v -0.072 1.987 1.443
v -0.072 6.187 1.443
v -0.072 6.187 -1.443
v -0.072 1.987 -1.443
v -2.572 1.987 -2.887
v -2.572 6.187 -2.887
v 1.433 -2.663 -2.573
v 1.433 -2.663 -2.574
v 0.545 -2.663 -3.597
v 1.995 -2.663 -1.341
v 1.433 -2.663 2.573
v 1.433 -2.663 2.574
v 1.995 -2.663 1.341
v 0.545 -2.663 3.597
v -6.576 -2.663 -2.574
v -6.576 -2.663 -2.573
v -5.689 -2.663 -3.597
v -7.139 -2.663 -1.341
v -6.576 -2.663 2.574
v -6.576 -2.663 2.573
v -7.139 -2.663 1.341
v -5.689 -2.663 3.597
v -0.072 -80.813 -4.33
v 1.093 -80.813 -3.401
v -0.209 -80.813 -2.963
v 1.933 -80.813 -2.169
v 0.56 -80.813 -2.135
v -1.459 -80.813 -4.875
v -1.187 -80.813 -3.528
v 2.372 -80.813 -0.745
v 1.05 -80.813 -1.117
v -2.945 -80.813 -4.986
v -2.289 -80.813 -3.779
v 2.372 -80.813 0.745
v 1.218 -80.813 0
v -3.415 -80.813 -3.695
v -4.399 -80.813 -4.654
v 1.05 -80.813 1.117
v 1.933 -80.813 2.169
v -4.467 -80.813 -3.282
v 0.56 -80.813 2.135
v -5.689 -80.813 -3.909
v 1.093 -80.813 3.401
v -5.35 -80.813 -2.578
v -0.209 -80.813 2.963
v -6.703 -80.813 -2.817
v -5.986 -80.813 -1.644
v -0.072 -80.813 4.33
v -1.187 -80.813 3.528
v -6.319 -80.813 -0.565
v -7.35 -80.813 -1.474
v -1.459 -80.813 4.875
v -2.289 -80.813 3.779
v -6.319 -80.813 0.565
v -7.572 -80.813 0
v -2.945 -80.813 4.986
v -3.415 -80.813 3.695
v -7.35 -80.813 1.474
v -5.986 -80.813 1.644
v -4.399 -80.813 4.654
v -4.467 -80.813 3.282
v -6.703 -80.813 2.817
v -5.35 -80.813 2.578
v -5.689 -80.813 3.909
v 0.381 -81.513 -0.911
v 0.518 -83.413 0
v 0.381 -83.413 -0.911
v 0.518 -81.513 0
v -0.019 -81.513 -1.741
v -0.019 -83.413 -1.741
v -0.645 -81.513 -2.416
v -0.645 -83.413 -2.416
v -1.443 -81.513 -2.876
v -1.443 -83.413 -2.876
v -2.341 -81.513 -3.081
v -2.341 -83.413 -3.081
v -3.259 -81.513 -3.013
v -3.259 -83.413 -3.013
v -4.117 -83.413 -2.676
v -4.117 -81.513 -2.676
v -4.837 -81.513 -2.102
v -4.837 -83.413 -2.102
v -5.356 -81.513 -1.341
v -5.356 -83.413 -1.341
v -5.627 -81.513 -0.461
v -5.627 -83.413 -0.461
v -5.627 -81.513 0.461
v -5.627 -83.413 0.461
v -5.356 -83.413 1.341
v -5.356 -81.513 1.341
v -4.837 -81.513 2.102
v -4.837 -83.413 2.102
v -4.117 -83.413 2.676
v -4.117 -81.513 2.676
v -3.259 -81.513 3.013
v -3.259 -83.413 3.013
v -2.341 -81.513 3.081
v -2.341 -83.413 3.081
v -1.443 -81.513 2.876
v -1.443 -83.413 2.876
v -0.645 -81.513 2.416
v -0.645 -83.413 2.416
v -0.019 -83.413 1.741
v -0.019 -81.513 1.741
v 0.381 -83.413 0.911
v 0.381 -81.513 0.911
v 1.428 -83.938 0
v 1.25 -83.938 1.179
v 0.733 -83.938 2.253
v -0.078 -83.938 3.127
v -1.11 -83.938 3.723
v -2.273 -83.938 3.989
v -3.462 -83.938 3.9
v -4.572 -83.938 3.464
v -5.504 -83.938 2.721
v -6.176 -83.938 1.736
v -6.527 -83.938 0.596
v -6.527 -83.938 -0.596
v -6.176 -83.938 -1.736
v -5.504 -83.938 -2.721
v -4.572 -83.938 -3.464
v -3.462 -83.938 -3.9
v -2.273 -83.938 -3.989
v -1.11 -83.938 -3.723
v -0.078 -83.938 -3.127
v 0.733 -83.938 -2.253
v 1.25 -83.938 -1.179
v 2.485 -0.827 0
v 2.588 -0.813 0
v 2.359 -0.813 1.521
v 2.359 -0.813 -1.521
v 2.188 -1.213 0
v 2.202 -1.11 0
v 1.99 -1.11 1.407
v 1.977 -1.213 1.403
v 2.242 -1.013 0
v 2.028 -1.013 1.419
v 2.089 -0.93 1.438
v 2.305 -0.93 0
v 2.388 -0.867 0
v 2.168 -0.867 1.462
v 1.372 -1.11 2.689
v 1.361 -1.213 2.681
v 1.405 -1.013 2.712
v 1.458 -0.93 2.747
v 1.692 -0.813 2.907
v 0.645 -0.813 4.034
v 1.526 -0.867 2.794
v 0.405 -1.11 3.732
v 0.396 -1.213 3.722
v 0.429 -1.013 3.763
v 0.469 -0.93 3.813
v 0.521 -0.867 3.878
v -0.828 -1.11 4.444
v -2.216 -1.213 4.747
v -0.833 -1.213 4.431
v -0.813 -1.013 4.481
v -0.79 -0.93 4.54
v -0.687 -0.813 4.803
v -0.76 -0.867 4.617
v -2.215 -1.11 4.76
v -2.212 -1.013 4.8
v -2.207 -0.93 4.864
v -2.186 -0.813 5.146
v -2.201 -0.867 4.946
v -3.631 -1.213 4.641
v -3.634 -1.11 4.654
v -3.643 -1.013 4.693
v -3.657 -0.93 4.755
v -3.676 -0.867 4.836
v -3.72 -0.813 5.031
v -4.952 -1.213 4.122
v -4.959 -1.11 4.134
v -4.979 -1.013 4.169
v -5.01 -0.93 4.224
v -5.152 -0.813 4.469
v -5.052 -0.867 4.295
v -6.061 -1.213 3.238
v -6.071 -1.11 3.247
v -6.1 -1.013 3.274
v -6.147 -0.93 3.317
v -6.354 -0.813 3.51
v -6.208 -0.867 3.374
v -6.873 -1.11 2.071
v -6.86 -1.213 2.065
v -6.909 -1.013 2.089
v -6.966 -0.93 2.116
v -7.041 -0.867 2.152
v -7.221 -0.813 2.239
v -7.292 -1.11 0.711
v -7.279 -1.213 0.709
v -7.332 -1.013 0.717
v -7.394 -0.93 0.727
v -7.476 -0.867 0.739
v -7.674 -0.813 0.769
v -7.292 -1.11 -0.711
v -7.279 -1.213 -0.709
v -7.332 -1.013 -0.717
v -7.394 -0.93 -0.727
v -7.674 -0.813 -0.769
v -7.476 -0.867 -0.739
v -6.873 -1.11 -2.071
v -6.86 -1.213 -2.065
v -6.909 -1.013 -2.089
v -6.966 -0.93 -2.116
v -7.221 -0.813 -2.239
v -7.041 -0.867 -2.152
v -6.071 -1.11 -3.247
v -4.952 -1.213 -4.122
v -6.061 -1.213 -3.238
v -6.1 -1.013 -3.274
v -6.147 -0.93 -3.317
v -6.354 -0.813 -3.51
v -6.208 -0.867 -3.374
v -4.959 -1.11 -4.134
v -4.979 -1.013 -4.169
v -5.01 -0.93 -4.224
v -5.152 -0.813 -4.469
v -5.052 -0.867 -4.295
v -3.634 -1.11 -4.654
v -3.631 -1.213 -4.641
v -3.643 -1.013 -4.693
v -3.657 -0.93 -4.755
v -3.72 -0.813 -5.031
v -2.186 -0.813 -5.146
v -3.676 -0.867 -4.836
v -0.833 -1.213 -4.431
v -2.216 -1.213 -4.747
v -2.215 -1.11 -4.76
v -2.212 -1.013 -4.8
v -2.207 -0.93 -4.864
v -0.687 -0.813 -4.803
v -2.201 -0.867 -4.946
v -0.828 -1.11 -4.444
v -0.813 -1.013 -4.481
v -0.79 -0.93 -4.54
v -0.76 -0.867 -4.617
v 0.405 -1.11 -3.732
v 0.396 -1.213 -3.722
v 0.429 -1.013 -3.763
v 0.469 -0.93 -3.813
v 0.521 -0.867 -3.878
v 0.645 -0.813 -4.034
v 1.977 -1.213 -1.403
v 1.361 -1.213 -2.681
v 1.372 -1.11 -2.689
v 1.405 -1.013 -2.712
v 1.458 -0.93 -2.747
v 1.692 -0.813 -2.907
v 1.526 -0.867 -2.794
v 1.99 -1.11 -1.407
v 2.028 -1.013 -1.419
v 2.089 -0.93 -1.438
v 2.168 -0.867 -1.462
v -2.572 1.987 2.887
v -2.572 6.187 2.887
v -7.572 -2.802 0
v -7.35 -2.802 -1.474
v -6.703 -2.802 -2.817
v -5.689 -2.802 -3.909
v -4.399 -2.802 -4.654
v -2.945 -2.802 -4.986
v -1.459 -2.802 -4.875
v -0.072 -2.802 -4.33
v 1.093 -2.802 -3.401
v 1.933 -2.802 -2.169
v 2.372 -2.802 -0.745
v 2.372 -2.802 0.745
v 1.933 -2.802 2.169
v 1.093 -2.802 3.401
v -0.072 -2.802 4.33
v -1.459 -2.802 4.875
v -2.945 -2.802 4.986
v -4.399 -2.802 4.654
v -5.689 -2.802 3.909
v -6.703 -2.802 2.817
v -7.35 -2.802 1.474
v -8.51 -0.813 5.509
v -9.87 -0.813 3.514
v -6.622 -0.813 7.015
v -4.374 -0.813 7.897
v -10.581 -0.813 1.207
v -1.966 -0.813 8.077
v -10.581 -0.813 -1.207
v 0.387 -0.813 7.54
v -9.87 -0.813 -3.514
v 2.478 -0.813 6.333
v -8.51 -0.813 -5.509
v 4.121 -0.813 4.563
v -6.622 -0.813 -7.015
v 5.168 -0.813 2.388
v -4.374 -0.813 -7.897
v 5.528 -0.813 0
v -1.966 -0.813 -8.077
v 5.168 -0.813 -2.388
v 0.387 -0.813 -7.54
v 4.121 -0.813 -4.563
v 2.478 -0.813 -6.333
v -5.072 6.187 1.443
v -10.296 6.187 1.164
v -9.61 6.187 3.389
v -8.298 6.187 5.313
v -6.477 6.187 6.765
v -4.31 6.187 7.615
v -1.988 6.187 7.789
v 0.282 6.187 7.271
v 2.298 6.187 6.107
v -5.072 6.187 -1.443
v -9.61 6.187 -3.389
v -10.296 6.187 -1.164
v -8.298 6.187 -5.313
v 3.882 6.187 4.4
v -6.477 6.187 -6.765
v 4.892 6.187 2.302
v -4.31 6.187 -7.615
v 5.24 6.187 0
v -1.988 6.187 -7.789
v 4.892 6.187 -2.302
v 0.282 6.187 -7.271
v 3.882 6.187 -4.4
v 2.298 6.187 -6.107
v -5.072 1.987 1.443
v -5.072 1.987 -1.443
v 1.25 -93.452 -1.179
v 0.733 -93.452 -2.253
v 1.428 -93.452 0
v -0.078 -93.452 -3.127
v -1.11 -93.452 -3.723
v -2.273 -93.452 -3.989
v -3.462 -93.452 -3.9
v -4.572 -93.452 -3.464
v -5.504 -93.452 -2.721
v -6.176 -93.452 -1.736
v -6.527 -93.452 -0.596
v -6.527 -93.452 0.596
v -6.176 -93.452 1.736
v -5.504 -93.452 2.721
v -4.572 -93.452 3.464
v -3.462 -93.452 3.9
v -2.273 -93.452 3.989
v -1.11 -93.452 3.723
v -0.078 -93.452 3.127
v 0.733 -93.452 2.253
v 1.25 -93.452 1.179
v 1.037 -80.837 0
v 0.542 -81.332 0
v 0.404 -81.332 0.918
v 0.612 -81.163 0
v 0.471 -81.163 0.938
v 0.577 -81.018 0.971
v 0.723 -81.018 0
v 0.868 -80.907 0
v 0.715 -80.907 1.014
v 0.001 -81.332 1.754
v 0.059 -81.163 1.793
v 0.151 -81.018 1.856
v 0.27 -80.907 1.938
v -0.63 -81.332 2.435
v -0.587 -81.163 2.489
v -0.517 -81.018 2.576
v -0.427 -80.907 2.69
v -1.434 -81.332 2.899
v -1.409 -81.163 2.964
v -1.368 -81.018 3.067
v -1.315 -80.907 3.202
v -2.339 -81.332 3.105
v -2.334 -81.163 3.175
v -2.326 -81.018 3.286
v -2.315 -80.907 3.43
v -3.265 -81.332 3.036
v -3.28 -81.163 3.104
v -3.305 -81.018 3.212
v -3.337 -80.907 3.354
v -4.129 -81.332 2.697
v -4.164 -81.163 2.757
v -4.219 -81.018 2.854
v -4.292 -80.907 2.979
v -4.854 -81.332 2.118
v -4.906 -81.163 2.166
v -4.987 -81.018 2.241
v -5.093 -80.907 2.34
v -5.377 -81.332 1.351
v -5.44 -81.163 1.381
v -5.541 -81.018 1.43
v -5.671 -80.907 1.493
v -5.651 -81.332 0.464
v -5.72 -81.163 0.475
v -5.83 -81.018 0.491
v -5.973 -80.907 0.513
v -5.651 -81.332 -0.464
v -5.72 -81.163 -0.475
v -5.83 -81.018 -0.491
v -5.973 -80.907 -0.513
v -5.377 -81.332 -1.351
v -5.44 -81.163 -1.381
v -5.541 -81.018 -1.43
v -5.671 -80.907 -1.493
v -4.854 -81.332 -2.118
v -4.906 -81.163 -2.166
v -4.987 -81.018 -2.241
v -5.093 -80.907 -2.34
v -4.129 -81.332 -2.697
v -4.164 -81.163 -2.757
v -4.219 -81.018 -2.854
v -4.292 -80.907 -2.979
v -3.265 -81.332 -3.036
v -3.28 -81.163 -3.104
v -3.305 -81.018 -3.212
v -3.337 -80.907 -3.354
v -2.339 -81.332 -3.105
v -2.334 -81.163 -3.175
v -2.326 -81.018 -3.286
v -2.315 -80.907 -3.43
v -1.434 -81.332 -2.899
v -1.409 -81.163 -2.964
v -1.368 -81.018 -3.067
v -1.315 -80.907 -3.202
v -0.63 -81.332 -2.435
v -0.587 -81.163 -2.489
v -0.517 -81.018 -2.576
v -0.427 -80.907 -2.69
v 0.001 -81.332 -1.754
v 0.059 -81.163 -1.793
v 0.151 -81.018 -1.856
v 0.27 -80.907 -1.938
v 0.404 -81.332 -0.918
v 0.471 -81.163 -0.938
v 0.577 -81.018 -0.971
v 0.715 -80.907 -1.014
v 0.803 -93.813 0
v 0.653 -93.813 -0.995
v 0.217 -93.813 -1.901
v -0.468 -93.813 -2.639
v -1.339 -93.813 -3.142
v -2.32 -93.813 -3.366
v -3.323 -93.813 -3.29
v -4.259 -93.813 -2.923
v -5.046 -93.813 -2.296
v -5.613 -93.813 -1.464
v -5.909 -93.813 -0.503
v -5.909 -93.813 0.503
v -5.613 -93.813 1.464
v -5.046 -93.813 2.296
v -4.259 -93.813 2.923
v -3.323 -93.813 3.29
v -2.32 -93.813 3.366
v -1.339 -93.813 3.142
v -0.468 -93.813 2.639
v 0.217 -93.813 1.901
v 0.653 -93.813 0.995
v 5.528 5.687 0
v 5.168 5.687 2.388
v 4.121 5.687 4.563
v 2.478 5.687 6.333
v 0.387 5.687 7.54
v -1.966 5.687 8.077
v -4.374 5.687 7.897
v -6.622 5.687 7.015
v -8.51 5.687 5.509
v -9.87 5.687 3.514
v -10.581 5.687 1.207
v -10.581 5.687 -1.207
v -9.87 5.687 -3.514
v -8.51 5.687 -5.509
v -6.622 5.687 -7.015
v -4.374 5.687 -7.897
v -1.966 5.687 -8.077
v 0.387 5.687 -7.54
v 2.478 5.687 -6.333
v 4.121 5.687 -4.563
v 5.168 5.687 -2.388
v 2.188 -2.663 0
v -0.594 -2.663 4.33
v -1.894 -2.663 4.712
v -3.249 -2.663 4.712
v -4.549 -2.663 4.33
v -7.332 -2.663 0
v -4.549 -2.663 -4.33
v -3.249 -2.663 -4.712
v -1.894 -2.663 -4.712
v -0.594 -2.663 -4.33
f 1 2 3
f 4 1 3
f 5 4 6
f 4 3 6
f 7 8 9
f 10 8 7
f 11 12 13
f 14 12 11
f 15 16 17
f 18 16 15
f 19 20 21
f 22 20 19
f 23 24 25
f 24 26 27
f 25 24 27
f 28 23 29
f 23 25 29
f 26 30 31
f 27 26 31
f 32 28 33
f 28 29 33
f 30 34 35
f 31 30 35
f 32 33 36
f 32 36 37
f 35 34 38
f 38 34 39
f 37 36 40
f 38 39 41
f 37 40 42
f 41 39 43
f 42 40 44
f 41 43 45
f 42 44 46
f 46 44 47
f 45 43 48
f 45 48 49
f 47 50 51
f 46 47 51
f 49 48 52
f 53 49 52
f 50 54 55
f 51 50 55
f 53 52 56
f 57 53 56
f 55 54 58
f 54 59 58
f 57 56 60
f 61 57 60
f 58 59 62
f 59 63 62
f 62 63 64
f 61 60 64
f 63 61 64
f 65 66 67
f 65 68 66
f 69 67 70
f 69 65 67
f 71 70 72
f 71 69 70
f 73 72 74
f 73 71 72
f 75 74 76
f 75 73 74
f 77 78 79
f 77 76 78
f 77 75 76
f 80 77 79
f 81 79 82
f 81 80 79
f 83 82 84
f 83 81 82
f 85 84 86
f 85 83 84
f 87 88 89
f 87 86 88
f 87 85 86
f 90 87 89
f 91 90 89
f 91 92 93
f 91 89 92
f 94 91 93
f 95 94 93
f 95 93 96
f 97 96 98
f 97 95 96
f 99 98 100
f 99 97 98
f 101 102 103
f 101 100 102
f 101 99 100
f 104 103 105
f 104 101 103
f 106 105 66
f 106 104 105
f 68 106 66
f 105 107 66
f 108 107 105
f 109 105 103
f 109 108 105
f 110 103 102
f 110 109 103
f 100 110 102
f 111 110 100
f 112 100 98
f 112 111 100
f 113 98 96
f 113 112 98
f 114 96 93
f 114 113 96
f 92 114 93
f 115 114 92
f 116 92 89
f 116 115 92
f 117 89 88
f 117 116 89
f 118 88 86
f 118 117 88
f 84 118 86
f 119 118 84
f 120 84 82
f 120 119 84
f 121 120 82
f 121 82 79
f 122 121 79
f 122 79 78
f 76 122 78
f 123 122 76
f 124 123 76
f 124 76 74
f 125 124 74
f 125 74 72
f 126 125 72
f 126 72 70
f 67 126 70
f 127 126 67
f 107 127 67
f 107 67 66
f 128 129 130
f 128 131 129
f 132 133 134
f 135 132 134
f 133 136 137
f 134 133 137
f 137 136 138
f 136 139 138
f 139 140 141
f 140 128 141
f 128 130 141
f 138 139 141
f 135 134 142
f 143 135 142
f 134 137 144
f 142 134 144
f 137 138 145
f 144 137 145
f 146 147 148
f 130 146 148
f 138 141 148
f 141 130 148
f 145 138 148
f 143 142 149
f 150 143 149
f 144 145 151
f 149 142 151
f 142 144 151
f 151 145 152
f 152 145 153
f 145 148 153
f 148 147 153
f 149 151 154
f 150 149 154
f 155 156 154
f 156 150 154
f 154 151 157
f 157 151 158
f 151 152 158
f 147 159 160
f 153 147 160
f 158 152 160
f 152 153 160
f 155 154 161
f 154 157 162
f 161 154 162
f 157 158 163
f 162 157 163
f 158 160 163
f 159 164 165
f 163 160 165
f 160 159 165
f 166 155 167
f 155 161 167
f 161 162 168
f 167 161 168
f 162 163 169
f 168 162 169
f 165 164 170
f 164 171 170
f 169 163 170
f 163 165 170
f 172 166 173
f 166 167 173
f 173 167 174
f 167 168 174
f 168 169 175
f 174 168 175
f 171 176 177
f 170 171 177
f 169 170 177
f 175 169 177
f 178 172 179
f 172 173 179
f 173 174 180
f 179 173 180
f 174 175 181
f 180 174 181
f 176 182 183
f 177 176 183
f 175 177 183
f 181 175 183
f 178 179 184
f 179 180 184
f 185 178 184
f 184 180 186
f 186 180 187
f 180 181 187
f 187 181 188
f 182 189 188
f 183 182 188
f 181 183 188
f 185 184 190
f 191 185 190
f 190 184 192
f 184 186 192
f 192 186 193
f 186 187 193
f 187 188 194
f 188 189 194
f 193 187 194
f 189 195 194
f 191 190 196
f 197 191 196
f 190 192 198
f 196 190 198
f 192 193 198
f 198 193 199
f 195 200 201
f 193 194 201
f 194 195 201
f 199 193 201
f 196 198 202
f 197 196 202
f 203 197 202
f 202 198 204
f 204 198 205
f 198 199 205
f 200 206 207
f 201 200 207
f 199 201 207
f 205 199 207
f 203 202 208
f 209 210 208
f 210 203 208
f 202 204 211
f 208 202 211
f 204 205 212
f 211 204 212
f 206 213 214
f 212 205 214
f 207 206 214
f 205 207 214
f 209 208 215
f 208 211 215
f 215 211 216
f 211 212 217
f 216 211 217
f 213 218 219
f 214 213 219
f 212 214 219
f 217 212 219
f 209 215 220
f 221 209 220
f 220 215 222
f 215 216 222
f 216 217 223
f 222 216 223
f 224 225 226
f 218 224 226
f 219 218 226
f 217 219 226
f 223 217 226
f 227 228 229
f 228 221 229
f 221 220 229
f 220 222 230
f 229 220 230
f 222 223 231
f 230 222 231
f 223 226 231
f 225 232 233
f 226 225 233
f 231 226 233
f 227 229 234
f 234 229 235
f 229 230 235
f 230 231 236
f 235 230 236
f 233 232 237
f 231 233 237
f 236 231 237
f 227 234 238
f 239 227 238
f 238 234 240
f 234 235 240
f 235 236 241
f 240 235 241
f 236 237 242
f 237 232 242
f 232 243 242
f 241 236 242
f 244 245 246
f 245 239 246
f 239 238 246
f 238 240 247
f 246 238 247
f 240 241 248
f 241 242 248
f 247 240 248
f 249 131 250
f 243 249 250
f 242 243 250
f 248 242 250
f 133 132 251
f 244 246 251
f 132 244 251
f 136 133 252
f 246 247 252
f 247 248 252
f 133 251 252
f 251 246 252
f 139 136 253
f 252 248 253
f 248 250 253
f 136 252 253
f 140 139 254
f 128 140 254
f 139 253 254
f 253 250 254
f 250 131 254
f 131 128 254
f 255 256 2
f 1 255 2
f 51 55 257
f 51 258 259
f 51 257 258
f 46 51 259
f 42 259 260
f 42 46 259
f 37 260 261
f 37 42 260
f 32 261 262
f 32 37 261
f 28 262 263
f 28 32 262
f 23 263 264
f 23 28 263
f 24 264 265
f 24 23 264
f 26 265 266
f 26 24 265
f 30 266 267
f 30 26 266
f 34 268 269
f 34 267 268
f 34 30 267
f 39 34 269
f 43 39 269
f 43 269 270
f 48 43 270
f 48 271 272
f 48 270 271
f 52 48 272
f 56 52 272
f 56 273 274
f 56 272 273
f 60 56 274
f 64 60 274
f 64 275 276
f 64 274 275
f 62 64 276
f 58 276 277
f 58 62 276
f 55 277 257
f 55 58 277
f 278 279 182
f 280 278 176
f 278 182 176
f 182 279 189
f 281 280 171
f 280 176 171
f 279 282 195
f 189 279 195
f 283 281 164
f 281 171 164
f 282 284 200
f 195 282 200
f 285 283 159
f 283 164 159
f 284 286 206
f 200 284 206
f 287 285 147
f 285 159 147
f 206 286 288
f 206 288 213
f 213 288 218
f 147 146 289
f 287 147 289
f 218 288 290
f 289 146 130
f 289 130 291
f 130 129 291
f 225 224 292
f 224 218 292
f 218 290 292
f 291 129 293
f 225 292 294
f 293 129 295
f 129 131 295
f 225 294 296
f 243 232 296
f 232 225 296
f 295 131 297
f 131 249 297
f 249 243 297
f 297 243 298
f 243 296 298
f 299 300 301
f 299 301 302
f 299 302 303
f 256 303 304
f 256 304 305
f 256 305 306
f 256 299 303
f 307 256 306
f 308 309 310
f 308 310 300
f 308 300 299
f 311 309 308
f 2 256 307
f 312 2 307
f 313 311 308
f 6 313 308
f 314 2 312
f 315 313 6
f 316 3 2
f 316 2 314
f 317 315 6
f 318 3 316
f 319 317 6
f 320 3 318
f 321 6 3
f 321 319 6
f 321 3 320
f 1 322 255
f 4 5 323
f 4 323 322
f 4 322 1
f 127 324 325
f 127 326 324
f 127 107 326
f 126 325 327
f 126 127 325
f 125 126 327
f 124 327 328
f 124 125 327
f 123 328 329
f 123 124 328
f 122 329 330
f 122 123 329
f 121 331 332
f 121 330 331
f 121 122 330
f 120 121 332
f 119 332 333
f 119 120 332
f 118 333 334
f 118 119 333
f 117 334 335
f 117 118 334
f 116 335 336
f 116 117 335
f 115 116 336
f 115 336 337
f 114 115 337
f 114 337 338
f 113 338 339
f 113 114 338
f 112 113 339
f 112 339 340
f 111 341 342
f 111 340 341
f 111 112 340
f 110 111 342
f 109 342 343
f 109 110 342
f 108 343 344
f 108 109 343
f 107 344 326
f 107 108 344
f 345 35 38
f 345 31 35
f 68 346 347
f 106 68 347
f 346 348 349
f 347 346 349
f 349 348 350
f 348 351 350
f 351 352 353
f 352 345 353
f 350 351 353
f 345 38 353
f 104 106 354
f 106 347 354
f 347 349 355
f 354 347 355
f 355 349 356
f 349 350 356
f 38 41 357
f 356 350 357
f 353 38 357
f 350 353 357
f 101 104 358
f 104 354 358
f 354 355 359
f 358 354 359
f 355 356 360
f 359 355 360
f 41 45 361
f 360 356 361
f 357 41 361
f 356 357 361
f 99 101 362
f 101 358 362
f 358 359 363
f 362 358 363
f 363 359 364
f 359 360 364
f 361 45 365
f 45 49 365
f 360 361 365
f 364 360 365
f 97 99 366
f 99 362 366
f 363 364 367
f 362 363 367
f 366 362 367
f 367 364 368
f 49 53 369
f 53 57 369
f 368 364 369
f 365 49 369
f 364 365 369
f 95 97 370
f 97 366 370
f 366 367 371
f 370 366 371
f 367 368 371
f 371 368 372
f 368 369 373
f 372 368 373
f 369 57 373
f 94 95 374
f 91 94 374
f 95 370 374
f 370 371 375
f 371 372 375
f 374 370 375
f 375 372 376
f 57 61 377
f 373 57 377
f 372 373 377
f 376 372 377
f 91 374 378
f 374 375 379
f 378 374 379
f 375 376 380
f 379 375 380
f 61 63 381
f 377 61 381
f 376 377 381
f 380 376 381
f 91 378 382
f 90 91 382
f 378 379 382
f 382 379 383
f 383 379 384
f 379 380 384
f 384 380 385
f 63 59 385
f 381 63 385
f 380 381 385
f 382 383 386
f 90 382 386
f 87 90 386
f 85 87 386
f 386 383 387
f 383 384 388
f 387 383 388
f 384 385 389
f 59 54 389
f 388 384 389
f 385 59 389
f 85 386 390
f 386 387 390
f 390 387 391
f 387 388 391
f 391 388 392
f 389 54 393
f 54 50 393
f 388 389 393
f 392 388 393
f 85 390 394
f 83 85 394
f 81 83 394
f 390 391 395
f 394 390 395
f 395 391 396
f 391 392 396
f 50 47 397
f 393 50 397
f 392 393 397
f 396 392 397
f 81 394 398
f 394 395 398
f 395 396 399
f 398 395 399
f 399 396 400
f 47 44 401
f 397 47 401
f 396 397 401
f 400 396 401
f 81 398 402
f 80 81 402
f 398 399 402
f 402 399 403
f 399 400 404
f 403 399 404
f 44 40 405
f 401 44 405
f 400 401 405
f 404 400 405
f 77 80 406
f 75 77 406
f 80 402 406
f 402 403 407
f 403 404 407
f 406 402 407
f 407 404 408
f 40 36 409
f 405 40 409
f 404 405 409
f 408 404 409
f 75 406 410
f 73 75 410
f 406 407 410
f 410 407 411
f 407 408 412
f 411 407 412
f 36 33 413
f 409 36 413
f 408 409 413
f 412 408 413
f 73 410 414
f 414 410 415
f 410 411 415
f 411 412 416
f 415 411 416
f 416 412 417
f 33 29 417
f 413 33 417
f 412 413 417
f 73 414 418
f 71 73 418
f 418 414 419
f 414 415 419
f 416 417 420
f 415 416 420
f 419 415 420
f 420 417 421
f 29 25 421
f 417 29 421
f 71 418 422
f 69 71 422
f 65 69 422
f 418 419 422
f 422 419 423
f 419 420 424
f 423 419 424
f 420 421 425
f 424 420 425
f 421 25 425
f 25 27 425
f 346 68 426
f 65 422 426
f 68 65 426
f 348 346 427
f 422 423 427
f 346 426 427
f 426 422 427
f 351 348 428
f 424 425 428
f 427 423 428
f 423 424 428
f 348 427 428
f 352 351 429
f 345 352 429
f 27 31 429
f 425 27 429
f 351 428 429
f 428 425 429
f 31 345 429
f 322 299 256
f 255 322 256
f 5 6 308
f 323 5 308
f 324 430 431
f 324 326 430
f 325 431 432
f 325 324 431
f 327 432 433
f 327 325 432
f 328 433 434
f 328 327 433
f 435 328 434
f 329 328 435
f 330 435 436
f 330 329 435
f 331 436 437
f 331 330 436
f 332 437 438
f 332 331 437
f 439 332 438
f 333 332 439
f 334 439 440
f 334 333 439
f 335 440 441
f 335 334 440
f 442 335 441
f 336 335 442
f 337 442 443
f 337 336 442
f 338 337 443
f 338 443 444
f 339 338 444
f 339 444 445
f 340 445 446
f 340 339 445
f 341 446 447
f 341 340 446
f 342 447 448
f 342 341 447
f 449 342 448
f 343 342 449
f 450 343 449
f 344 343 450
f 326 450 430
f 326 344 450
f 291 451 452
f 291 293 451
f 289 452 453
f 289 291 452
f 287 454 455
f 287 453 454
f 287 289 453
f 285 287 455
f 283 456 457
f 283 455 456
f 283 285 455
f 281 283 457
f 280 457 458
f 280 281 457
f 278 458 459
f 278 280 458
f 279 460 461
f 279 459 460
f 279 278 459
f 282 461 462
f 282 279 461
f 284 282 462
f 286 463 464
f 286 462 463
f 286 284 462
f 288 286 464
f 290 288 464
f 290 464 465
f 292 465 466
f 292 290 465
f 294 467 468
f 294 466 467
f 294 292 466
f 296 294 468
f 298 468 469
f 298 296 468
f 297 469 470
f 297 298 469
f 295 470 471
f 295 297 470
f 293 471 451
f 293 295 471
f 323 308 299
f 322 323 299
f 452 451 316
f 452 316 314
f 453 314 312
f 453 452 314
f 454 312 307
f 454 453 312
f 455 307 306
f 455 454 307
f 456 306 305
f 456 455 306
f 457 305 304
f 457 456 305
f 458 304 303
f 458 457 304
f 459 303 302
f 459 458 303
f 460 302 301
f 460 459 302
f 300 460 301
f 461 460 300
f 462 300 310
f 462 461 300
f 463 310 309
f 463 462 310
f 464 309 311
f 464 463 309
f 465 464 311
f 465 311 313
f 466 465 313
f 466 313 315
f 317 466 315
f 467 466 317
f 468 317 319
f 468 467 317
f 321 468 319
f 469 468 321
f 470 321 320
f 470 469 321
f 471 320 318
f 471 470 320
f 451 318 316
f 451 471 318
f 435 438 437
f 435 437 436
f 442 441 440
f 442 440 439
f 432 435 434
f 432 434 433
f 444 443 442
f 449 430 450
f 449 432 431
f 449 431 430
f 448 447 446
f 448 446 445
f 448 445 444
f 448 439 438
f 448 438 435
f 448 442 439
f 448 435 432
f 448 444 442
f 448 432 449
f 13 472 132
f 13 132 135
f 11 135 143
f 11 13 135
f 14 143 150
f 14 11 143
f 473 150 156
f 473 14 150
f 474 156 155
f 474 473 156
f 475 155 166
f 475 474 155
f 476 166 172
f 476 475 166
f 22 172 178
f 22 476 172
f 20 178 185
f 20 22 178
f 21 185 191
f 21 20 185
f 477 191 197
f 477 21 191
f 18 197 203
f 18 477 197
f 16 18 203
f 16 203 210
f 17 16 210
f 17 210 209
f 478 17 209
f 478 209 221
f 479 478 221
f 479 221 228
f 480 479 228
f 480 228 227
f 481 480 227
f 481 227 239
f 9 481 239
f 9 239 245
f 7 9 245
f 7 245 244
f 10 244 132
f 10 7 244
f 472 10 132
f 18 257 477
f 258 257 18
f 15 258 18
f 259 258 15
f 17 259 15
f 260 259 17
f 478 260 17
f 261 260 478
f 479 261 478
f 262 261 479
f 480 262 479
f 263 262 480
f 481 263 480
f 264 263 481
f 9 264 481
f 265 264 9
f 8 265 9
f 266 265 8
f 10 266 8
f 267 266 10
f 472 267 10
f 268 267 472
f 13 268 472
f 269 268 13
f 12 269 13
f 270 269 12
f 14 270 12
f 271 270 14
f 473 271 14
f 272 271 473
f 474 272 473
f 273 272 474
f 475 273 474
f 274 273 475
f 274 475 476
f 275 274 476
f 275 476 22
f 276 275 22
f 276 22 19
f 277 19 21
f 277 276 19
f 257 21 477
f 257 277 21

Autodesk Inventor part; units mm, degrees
ref_plane "YZ Plane" through (0, 0, 0) normal (1, 0, 0) x (0, 1, 0)
ref_plane "XZ Plane" through (0, 0, 0) normal (0, 1, 0) x (-1, 0, 0)
ref_plane "XY Plane" through (0, 0, 0) normal (0, 0, 1) x (1, 0, 0)
sketch "Sketch1" plane through (0, 0, 0) normal (0, 0, 1) x (1, 0, 0)
  line L0 (-2.5718, -2.6632) -> (-7.5718, -2.6632)
  line L1 (-7.5718, -2.6632) -> (-7.5718, -80.8132)
  line L2 (-7.5718, -80.8132) -> (-2.5718, -80.8132)
  line L3 (-2.5718, -80.8132) -> (-2.5718, -2.6632)
  dimension "d1" = 78.15
  dimension "d2" = 5
revolve "Shoulder" add sketch "Sketch1" angle 360 about axis through (-2.5718, -80.8132, 0) along (0, 1, 0)
sketch "Sketch2" plane through (-2.5718, -2.6632, 0) normal (0, 1, 0) x (1, 0, 0)
  circle A0 centre (0, 0) radius 5 projected
  circle A1 centre (0, 0) radius 4.76
  dimension "d3" = 9.52
extrude "Shoulder_neck" add sketch "Sketch2" along normal blind 1.85 contours A1
sketch "Sketch3" plane through (-2.5718, -0.8132, 0) normal (0, 1, 0) x (1, 0, 0)
  circle A0 centre (0, 0) radius 4.76 projected
  circle A1 centre (0, 0) radius 8.1
  dimension "d6" = 16.2
extrude "Head" add sketch "Sketch3" along normal blind 7 contours A0 | A1
sketch "Sketch4" plane through (-2.5718, -80.8132, 0) normal (0, -1, 0) x (1, 0, 0)
  circle A0 centre (0, 0) radius 5 projected
  circle A1 centre (0, 0) radius 3.09
  dimension "d9" = 6.18
extrude "Thread_neck" add sketch "Sketch4" along normal blind 2.6 contours A1
sketch "Sketch5" plane through (-2.5718, -83.4132, 0) normal (0, -1, 0) x (1, 0, 0)
  circle A0 centre (0, 0) radius 3.09 projected
  circle A1 centre (0, 0) radius 4
  dimension "d12" = 8
extrude "Thread_shoulder" add sketch "Sketch5" along normal blind 10.4 contours A0 | A1
sketch "Sketch6" plane through (-2.5718, 6.1868, 0) normal (0, 1, 0) x (1, 0, 0)
  circle A0 centre (0, 0) radius 8.1 projected
  circle A1 centre (0, 0) radius 2.5 construction
  line L0 (-2.5, 1.4434) -> (-2.5, -1.4434)
  line L1 (-2.5, -1.4434) -> (0, -2.8868)
  line L2 (0, -2.8868) -> (2.5, -1.4434)
  line L3 (2.5, -1.4434) -> (2.5, 1.4434)
  line L4 (2.5, 1.4434) -> (0, 2.8868)
  line L5 (0, 2.8868) -> (-2.5, 1.4434)
  dimension "d15" = 5
extrude "Hex" cut sketch "Sketch6" against normal blind 4.2 contours L5 L4 L3 L2 L1 L0
chamfer "Chamfer1" distance 0.24 angle 30 1 edges at (2.4282, -2.6632, 0) measured on face at (-7.3973, -2.6632, -0.7786)
fillet "Fillet1" radius 0.4 1 edges at (-7.3318, -0.8132, 0)
chamfer "Chamfer2" distance 0.5 angle 30 1 edges at (-10.6718, 6.1868, 0) measured on face at (5.4233, 3.8535, 1.2993)
chamfer "Chamfer3" distance 0.625 angle 30 1 edges at (-6.5718, -93.8132, 0) measured on face at (-1.8144, -93.8132, 1.0973)
fillet "Fillet2" radius 0.7 1 edges at (-5.6618, -80.8132, 0)
chamfer "Chamfer7" distance 0.91 angle 30 1 edges at (-6.5718, -83.4132, 0) measured on face at (1.0861, -83.4132, -0.3191)
thread "Thread" size "M8x1.25" class "6g" standard "ANSI Metric M Profile" full length
equation "\"d1\" = Shoulder_length - Shoulder_neck_length"
equation "\"d2\" = 0.5 * Shoulder_diameter"
equation "\"d3\" = Shoulder_neck_dia"
equation "\"d4\" = Shoulder_neck_length"
equation "\"d6\" = Head_diameter"
equation "\"d7\" = Head_height"
equation "\"d9\" = Thread_neck_dia"
equation "\"d10\" = Thread_neck_length"
equation "\"d12\" = Thread_diameter"
equation "\"d13\" = Thread_length - Thread_neck_length"
equation "\"d15\" = Hex_size"
equation "\"d16\" = Hex_length"
equation "\"d18\" = -0.5 * Shoulder_neck_dia + 0.5 * Shoulder_diameter"
equation "\"d64\" = -0.5 * Shoulder_neck_dia + 0.5 * Shoulder_diameter"
equation "\"d21\" = 0.1 * Hex_size"
equation "\"d65\" = 0.1 * Hex_size"
equation "\"d23\" = 0.5 * Thread_pitch"
equation "\"d66\" = 0.5 * Thread_pitch"
equation "\"d25\" = Thread_neck_radius"
equation "\"d60\" = -0.5 * Thread_neck_dia + 0.5 * Thread_diameter"
equation "\"d67\" = -0.5 * Thread_neck_dia + 0.5 * Thread_diameter"
equation "\"Shoulder_length\" = 80"
equation "\"Shoulder_neck_dia\" = 9.52"
equation "\"Thread_diameter\" = 8"
equation "\"Thread_length\" = 13"
equation "\"Head_diameter\" = 16.2"
equation "\"Head_height\" = 7"
equation "\"Thread_neck_dia\" = 6.18"
equation "\"Hex_size\" = 5"
equation "\"Hex_length\" = 4.2"
equation "\"Thread_pitch\" = 1.25"
equation "\"Shoulder_neck_length\" = 1.85"
equation "\"Thread_neck_length\" = 2.6"
equation "\"Thread_neck_radius\" = 0.7"
equation "\"Shoulder_diameter\" = 10"
properties part number "SCREW, SHOULDER, P, 12.9,  M10X80MM" material "Steel, High Strength Low Alloy"
